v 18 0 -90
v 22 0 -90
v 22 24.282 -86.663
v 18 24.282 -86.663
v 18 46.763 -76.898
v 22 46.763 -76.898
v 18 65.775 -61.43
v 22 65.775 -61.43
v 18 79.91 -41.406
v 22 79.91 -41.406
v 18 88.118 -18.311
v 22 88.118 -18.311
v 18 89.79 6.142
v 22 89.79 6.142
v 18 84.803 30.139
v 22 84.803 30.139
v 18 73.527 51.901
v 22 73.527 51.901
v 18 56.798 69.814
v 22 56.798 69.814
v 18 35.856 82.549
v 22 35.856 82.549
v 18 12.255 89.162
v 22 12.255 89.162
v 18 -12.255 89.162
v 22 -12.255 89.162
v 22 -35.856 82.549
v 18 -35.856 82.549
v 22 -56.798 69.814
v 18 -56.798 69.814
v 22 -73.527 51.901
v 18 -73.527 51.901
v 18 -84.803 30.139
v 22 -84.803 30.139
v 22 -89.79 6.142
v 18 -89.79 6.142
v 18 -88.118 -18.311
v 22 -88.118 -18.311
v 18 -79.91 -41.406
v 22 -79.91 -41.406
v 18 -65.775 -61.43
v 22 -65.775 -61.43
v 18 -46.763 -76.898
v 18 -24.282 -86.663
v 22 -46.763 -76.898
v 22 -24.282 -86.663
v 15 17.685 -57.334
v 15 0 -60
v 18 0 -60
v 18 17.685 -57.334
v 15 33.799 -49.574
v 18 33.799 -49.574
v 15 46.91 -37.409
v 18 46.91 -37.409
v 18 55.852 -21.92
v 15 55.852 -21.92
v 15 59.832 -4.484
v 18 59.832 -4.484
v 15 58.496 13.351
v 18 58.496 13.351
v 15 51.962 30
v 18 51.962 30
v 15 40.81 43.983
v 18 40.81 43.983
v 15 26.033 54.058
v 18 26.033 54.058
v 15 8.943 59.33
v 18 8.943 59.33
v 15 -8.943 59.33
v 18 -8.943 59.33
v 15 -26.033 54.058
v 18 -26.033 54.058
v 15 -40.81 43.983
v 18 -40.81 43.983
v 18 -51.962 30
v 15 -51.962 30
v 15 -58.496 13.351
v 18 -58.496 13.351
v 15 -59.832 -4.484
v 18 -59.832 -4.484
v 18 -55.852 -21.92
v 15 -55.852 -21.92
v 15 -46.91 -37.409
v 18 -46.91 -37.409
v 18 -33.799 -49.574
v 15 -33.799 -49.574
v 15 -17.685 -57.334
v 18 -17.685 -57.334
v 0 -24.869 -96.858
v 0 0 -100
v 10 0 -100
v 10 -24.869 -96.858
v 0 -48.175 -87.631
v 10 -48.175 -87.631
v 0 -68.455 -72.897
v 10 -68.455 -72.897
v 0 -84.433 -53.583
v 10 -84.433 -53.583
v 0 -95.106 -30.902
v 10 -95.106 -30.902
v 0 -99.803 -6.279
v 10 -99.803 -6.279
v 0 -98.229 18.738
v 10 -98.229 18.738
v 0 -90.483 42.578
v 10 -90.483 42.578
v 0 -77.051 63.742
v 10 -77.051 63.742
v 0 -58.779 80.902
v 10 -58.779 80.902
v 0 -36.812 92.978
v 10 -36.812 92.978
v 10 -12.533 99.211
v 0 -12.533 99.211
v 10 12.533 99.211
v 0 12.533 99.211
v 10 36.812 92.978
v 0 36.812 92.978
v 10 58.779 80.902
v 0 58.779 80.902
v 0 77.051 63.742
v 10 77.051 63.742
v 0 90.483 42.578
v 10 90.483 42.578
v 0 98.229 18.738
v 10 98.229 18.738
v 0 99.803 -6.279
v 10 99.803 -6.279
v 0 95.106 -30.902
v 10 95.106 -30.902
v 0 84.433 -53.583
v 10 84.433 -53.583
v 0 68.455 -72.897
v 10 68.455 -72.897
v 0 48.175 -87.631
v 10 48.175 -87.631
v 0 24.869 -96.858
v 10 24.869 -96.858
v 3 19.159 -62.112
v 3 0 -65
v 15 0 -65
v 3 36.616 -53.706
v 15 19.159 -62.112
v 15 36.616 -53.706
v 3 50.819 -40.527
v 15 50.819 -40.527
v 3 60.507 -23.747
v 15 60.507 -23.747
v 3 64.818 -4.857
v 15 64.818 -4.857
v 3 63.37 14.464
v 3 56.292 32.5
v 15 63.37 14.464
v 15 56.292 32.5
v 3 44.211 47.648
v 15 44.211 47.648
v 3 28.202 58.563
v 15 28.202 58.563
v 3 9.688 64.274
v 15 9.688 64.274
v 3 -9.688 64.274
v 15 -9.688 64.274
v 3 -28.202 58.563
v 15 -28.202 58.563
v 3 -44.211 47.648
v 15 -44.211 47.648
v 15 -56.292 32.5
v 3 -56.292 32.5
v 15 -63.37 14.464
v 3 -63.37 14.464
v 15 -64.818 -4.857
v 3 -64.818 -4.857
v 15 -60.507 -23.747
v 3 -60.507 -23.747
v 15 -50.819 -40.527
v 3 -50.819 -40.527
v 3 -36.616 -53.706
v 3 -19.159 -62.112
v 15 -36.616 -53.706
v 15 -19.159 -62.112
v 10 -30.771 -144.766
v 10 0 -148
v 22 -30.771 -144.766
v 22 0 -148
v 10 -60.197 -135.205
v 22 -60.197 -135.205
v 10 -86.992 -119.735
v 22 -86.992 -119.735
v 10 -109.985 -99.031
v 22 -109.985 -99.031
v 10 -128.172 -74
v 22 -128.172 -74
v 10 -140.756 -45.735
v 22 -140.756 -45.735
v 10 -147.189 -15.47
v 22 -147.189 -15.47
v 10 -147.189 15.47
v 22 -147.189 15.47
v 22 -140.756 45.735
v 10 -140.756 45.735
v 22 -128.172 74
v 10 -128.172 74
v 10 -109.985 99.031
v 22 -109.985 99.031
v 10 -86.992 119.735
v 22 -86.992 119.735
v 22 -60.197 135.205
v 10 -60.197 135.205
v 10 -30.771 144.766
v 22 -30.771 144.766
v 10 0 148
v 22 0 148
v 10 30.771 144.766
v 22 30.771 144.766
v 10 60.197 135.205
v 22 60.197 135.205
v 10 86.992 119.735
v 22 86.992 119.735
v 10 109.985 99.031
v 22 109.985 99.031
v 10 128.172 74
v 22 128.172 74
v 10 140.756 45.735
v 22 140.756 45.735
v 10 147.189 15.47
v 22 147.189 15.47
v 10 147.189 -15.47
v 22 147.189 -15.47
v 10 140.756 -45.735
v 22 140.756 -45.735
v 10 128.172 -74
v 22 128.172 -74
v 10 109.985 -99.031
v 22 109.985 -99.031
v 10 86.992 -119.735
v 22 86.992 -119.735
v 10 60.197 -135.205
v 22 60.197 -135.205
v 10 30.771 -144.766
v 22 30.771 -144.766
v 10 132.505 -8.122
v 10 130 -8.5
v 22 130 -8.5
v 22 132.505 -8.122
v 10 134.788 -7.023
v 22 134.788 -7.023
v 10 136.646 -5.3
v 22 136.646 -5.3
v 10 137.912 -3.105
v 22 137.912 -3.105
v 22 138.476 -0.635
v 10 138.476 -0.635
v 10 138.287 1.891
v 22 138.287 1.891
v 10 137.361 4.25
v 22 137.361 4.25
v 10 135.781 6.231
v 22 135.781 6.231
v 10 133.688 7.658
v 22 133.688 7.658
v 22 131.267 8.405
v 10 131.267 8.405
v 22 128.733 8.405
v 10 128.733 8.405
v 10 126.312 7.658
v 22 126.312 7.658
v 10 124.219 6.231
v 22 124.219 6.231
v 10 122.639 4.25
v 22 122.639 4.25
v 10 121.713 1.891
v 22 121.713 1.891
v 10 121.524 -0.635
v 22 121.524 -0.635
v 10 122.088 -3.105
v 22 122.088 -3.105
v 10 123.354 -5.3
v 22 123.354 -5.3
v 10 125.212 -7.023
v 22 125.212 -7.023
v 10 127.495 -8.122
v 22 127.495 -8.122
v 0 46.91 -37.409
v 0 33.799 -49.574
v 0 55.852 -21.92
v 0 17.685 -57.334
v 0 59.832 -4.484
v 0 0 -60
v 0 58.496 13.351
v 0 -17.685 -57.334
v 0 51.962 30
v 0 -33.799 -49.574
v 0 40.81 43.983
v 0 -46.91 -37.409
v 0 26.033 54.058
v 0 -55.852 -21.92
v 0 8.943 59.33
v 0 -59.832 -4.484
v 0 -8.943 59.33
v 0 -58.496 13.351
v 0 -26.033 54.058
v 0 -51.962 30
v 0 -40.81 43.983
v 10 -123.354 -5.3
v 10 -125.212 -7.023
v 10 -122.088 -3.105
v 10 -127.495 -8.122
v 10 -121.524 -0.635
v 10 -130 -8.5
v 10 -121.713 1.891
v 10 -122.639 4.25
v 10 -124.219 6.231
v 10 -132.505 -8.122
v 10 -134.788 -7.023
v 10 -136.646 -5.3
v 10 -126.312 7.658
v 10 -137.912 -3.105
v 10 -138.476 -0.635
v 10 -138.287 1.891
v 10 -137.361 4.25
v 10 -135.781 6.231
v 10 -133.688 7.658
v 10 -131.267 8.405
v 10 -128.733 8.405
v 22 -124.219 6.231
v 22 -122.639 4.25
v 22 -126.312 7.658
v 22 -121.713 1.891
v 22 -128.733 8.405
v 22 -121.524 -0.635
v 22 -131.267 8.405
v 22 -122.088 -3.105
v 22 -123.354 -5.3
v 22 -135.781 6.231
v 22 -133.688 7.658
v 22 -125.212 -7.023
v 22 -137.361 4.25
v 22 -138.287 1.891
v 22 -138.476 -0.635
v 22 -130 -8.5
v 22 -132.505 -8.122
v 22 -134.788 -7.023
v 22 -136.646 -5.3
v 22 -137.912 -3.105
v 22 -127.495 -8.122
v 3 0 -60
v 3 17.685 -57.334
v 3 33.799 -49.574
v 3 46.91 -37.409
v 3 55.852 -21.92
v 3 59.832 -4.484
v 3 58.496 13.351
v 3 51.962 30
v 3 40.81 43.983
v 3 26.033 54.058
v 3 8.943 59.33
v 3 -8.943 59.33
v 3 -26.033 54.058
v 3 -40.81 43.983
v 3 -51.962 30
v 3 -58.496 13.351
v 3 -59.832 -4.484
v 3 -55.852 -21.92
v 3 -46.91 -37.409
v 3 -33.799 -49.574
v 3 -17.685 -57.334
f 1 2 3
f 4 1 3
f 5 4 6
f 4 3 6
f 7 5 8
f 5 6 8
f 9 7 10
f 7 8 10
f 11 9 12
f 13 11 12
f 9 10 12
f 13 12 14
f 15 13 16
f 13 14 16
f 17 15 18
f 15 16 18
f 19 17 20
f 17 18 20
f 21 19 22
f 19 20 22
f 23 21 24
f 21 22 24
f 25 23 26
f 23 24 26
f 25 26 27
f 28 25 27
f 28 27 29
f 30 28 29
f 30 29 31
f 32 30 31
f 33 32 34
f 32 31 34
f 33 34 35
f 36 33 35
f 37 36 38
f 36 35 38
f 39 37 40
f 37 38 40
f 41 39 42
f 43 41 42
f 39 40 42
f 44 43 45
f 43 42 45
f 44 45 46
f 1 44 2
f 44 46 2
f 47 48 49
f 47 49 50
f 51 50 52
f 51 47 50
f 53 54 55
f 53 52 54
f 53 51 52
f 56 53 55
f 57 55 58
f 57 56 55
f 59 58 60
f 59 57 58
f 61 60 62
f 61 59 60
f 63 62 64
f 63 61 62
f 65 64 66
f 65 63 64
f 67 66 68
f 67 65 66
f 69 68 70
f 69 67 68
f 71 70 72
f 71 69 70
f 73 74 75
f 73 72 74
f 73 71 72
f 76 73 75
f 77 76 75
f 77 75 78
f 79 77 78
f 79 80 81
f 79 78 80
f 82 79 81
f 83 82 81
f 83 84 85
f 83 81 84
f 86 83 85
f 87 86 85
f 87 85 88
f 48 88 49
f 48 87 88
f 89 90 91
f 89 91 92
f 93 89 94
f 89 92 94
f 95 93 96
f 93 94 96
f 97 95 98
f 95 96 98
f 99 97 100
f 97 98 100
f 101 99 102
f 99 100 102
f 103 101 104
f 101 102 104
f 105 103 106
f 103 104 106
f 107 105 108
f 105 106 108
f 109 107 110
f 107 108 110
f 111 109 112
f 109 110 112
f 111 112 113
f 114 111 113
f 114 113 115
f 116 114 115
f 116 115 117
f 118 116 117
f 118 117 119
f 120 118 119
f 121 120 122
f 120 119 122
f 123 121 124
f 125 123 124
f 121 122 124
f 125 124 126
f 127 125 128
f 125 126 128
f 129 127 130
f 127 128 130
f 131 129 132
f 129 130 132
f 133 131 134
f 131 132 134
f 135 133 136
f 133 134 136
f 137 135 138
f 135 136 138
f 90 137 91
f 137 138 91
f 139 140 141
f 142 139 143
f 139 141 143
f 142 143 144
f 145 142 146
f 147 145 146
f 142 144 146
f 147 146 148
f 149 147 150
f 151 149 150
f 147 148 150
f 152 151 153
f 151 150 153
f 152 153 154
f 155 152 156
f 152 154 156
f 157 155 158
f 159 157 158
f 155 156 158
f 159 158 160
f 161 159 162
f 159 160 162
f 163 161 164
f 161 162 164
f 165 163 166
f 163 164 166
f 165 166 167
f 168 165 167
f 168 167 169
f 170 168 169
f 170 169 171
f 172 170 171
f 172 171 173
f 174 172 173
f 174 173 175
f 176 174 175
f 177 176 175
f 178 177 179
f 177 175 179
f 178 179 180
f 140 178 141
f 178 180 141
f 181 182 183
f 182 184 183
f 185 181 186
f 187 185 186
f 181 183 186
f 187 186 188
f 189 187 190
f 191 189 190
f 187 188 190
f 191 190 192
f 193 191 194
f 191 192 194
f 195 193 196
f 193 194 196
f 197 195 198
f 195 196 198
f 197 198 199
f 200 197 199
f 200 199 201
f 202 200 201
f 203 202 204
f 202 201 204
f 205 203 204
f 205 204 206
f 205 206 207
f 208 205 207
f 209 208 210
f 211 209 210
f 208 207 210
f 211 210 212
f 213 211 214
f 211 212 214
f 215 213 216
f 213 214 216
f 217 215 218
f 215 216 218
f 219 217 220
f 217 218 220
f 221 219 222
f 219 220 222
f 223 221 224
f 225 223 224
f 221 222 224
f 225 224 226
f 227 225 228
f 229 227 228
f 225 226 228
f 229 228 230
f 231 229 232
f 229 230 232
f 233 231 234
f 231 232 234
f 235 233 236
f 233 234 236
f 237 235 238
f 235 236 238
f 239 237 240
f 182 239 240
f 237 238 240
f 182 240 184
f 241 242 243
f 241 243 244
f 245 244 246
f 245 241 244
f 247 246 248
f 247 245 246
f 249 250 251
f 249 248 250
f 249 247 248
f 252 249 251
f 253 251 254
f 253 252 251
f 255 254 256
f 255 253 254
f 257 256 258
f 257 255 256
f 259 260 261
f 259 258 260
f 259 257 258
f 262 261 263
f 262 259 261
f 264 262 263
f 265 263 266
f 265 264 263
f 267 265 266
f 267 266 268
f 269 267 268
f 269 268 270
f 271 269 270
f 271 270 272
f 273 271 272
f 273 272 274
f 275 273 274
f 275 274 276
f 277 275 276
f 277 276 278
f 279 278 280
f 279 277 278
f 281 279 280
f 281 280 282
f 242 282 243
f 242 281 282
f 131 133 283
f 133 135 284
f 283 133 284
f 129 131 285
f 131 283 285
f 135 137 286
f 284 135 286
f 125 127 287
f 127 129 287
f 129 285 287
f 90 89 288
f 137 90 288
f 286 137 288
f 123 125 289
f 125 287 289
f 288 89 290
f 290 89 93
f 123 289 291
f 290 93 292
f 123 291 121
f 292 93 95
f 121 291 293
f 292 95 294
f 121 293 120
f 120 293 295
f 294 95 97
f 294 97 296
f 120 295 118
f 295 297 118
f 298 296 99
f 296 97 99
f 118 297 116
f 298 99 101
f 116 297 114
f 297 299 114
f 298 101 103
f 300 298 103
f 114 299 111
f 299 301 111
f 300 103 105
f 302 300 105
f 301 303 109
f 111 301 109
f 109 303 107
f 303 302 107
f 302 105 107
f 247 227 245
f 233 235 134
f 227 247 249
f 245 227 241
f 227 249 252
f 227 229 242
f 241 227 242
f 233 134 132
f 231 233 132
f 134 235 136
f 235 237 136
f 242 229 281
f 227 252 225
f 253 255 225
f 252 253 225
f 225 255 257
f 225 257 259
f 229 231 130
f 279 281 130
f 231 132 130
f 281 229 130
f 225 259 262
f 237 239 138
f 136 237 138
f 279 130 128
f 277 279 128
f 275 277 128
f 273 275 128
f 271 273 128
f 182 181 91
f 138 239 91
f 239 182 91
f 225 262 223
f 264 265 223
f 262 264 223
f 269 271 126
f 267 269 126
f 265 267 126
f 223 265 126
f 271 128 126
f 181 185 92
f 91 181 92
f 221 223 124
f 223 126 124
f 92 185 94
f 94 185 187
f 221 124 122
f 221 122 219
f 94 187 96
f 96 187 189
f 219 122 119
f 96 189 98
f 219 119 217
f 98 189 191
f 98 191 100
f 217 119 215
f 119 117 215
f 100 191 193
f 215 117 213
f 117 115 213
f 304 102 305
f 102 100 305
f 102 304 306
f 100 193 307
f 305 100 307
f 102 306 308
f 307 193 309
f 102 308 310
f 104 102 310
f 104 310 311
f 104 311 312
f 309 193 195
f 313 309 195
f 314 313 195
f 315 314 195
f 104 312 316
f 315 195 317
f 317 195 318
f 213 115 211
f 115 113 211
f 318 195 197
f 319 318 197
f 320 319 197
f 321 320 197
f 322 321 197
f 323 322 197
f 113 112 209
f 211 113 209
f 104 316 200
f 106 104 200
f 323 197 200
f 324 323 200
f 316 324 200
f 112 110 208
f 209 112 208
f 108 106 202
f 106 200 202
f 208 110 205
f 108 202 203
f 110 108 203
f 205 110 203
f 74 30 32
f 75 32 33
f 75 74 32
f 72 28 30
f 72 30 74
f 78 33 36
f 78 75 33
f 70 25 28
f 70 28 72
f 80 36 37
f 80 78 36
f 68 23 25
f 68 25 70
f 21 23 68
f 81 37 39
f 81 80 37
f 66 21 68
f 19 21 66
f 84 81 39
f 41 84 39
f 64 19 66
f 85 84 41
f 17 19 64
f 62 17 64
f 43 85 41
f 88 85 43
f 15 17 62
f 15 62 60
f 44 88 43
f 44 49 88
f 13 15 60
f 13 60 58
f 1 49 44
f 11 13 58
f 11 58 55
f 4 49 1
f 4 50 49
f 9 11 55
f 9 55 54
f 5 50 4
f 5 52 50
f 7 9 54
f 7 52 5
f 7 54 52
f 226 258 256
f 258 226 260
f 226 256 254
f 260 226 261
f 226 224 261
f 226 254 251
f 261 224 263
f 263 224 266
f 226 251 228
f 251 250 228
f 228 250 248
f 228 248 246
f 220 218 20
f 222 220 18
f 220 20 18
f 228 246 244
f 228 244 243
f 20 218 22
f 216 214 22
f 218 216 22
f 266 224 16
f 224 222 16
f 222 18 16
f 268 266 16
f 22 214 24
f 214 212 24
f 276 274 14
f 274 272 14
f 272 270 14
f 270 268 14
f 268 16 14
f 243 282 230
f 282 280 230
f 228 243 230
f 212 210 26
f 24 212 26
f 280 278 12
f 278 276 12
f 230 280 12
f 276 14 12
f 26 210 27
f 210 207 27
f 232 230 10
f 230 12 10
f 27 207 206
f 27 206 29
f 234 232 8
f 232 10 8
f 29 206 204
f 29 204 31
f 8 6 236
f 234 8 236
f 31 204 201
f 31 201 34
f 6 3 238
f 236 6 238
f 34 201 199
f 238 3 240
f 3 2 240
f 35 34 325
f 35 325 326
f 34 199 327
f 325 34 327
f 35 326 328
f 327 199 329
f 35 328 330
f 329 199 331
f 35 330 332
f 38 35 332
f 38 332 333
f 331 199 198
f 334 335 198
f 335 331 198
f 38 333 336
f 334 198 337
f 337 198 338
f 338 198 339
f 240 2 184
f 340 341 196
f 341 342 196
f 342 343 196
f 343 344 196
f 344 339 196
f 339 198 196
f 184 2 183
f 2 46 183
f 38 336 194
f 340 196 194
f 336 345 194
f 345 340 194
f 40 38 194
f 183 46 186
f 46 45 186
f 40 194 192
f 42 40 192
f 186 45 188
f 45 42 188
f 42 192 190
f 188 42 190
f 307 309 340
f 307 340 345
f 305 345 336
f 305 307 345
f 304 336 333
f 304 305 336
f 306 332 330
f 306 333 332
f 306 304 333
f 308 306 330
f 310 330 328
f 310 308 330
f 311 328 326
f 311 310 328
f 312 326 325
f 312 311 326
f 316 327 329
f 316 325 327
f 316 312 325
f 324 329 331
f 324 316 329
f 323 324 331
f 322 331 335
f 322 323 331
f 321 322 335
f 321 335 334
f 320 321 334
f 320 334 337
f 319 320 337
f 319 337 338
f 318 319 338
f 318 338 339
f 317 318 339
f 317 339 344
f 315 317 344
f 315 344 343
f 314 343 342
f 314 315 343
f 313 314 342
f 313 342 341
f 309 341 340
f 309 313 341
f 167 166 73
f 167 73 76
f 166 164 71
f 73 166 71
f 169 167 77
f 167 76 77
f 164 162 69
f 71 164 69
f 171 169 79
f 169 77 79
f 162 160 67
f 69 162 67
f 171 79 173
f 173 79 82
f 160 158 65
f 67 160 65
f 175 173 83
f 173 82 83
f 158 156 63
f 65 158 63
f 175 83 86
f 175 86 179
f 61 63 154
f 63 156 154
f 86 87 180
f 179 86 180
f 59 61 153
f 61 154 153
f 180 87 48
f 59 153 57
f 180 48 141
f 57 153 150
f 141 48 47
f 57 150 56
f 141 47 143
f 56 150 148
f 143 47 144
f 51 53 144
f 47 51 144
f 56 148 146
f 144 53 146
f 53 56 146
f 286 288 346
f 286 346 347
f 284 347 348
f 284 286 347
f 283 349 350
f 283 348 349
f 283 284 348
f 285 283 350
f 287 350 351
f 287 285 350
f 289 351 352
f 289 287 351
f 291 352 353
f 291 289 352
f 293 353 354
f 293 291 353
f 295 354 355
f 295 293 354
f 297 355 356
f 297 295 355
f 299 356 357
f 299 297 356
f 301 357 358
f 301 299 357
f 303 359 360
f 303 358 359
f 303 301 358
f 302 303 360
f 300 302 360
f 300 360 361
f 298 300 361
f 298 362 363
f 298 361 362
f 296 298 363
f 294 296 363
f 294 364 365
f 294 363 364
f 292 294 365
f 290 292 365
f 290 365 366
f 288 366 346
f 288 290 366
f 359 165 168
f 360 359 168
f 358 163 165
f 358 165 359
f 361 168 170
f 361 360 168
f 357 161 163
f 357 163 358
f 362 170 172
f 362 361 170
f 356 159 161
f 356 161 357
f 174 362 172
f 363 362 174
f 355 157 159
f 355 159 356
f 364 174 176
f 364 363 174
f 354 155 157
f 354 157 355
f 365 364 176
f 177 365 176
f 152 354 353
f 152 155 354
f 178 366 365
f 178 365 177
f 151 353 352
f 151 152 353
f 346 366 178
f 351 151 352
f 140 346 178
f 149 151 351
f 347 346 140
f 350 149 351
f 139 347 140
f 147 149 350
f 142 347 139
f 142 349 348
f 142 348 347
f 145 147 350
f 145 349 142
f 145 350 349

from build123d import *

# Parameters (mm, degrees)
ENL_V_MAT_EXTRU_1_DEPTH      = 211.456646367
ENL_V_MAT_EXTRU_1_DEPTH_BACK = 211.456646367
ESQUISSE2_R                  = 8.5
ESQUISSE3_R                  = 90
ENL_V_MAT_EXTRU_2_DEPTH      = 4
ENL_V_START                  = -3
ESQUISSE6_R                  = 65
ENL_V_MAT_EXTRU_5_DEPTH      = 12
ENL_V_MAT_EXTRU_6_DEPTH      = 211.456646367
ENL_V_MAT_EXTRU_6_DEPTH_BACK = 211.456646367
ESQUISSE7_R                  = 60


with BuildPart() as part:
    # Esquisse1 → Révolution1 (revolve)
    with BuildSketch(Plane.XY, mode=Mode.PRIVATE) as r_volution1_sk:
        Polygon((22, 0), (0, 0), (0, 100), (10, 100), (10, 148), (22, 148), align=None)
    revolve(r_volution1_sk.sketch.rotate(Axis((22, 0, 0), (-1, 0, 0)), 90), axis=Axis((22, 0, 0), (-1, 0, 0)))

    # Esquisse2 → Enlèv. mat.-Extru.1 (cut, two sides: drawn at the far end of the back side and taken through both)
    with BuildSketch(Plane(origin=(22, 0, 0), x_dir=(0, 0, -1), z_dir=(1, 0, 0)).offset(-ENL_V_MAT_EXTRU_1_DEPTH_BACK)):
        with Locations((0, 130)):
            Circle(ESQUISSE2_R)
        with Locations((0, -130)):
            Circle(ESQUISSE2_R)
    extrude(amount=ENL_V_MAT_EXTRU_1_DEPTH + ENL_V_MAT_EXTRU_1_DEPTH_BACK, mode=Mode.SUBTRACT)

    # Esquisse3 → Enlèv. mat.-Extru.2 (cut)
    with BuildSketch(Plane(origin=(22, 0, 0), x_dir=(0, 0, -1), z_dir=(1, 0, 0))):
        Circle(ESQUISSE3_R)
    extrude(amount=-ENL_V_MAT_EXTRU_2_DEPTH, mode=Mode.SUBTRACT)

    # Esquisse6 → Enlèv. mat.-Extru.5 (cut)
    with BuildSketch(Plane(origin=(18, 0, 0), x_dir=(0, 0, -1), z_dir=(1, 0, 0)).offset(ENL_V_START)):
        Circle(ESQUISSE6_R)
    extrude(amount=-ENL_V_MAT_EXTRU_5_DEPTH, mode=Mode.SUBTRACT)

    # Esquisse7 → Enlèv. mat.-Extru.6 (cut, two sides: drawn at the far end of the back side and taken through both)
    with BuildSketch(Plane(origin=(22, 0, 0), x_dir=(0, 0, -1), z_dir=(1, 0, 0)).offset(-ENL_V_MAT_EXTRU_6_DEPTH_BACK)):
        Circle(ESQUISSE7_R)
    extrude(amount=ENL_V_MAT_EXTRU_6_DEPTH + ENL_V_MAT_EXTRU_6_DEPTH_BACK, mode=Mode.SUBTRACT)


solid = part.part
